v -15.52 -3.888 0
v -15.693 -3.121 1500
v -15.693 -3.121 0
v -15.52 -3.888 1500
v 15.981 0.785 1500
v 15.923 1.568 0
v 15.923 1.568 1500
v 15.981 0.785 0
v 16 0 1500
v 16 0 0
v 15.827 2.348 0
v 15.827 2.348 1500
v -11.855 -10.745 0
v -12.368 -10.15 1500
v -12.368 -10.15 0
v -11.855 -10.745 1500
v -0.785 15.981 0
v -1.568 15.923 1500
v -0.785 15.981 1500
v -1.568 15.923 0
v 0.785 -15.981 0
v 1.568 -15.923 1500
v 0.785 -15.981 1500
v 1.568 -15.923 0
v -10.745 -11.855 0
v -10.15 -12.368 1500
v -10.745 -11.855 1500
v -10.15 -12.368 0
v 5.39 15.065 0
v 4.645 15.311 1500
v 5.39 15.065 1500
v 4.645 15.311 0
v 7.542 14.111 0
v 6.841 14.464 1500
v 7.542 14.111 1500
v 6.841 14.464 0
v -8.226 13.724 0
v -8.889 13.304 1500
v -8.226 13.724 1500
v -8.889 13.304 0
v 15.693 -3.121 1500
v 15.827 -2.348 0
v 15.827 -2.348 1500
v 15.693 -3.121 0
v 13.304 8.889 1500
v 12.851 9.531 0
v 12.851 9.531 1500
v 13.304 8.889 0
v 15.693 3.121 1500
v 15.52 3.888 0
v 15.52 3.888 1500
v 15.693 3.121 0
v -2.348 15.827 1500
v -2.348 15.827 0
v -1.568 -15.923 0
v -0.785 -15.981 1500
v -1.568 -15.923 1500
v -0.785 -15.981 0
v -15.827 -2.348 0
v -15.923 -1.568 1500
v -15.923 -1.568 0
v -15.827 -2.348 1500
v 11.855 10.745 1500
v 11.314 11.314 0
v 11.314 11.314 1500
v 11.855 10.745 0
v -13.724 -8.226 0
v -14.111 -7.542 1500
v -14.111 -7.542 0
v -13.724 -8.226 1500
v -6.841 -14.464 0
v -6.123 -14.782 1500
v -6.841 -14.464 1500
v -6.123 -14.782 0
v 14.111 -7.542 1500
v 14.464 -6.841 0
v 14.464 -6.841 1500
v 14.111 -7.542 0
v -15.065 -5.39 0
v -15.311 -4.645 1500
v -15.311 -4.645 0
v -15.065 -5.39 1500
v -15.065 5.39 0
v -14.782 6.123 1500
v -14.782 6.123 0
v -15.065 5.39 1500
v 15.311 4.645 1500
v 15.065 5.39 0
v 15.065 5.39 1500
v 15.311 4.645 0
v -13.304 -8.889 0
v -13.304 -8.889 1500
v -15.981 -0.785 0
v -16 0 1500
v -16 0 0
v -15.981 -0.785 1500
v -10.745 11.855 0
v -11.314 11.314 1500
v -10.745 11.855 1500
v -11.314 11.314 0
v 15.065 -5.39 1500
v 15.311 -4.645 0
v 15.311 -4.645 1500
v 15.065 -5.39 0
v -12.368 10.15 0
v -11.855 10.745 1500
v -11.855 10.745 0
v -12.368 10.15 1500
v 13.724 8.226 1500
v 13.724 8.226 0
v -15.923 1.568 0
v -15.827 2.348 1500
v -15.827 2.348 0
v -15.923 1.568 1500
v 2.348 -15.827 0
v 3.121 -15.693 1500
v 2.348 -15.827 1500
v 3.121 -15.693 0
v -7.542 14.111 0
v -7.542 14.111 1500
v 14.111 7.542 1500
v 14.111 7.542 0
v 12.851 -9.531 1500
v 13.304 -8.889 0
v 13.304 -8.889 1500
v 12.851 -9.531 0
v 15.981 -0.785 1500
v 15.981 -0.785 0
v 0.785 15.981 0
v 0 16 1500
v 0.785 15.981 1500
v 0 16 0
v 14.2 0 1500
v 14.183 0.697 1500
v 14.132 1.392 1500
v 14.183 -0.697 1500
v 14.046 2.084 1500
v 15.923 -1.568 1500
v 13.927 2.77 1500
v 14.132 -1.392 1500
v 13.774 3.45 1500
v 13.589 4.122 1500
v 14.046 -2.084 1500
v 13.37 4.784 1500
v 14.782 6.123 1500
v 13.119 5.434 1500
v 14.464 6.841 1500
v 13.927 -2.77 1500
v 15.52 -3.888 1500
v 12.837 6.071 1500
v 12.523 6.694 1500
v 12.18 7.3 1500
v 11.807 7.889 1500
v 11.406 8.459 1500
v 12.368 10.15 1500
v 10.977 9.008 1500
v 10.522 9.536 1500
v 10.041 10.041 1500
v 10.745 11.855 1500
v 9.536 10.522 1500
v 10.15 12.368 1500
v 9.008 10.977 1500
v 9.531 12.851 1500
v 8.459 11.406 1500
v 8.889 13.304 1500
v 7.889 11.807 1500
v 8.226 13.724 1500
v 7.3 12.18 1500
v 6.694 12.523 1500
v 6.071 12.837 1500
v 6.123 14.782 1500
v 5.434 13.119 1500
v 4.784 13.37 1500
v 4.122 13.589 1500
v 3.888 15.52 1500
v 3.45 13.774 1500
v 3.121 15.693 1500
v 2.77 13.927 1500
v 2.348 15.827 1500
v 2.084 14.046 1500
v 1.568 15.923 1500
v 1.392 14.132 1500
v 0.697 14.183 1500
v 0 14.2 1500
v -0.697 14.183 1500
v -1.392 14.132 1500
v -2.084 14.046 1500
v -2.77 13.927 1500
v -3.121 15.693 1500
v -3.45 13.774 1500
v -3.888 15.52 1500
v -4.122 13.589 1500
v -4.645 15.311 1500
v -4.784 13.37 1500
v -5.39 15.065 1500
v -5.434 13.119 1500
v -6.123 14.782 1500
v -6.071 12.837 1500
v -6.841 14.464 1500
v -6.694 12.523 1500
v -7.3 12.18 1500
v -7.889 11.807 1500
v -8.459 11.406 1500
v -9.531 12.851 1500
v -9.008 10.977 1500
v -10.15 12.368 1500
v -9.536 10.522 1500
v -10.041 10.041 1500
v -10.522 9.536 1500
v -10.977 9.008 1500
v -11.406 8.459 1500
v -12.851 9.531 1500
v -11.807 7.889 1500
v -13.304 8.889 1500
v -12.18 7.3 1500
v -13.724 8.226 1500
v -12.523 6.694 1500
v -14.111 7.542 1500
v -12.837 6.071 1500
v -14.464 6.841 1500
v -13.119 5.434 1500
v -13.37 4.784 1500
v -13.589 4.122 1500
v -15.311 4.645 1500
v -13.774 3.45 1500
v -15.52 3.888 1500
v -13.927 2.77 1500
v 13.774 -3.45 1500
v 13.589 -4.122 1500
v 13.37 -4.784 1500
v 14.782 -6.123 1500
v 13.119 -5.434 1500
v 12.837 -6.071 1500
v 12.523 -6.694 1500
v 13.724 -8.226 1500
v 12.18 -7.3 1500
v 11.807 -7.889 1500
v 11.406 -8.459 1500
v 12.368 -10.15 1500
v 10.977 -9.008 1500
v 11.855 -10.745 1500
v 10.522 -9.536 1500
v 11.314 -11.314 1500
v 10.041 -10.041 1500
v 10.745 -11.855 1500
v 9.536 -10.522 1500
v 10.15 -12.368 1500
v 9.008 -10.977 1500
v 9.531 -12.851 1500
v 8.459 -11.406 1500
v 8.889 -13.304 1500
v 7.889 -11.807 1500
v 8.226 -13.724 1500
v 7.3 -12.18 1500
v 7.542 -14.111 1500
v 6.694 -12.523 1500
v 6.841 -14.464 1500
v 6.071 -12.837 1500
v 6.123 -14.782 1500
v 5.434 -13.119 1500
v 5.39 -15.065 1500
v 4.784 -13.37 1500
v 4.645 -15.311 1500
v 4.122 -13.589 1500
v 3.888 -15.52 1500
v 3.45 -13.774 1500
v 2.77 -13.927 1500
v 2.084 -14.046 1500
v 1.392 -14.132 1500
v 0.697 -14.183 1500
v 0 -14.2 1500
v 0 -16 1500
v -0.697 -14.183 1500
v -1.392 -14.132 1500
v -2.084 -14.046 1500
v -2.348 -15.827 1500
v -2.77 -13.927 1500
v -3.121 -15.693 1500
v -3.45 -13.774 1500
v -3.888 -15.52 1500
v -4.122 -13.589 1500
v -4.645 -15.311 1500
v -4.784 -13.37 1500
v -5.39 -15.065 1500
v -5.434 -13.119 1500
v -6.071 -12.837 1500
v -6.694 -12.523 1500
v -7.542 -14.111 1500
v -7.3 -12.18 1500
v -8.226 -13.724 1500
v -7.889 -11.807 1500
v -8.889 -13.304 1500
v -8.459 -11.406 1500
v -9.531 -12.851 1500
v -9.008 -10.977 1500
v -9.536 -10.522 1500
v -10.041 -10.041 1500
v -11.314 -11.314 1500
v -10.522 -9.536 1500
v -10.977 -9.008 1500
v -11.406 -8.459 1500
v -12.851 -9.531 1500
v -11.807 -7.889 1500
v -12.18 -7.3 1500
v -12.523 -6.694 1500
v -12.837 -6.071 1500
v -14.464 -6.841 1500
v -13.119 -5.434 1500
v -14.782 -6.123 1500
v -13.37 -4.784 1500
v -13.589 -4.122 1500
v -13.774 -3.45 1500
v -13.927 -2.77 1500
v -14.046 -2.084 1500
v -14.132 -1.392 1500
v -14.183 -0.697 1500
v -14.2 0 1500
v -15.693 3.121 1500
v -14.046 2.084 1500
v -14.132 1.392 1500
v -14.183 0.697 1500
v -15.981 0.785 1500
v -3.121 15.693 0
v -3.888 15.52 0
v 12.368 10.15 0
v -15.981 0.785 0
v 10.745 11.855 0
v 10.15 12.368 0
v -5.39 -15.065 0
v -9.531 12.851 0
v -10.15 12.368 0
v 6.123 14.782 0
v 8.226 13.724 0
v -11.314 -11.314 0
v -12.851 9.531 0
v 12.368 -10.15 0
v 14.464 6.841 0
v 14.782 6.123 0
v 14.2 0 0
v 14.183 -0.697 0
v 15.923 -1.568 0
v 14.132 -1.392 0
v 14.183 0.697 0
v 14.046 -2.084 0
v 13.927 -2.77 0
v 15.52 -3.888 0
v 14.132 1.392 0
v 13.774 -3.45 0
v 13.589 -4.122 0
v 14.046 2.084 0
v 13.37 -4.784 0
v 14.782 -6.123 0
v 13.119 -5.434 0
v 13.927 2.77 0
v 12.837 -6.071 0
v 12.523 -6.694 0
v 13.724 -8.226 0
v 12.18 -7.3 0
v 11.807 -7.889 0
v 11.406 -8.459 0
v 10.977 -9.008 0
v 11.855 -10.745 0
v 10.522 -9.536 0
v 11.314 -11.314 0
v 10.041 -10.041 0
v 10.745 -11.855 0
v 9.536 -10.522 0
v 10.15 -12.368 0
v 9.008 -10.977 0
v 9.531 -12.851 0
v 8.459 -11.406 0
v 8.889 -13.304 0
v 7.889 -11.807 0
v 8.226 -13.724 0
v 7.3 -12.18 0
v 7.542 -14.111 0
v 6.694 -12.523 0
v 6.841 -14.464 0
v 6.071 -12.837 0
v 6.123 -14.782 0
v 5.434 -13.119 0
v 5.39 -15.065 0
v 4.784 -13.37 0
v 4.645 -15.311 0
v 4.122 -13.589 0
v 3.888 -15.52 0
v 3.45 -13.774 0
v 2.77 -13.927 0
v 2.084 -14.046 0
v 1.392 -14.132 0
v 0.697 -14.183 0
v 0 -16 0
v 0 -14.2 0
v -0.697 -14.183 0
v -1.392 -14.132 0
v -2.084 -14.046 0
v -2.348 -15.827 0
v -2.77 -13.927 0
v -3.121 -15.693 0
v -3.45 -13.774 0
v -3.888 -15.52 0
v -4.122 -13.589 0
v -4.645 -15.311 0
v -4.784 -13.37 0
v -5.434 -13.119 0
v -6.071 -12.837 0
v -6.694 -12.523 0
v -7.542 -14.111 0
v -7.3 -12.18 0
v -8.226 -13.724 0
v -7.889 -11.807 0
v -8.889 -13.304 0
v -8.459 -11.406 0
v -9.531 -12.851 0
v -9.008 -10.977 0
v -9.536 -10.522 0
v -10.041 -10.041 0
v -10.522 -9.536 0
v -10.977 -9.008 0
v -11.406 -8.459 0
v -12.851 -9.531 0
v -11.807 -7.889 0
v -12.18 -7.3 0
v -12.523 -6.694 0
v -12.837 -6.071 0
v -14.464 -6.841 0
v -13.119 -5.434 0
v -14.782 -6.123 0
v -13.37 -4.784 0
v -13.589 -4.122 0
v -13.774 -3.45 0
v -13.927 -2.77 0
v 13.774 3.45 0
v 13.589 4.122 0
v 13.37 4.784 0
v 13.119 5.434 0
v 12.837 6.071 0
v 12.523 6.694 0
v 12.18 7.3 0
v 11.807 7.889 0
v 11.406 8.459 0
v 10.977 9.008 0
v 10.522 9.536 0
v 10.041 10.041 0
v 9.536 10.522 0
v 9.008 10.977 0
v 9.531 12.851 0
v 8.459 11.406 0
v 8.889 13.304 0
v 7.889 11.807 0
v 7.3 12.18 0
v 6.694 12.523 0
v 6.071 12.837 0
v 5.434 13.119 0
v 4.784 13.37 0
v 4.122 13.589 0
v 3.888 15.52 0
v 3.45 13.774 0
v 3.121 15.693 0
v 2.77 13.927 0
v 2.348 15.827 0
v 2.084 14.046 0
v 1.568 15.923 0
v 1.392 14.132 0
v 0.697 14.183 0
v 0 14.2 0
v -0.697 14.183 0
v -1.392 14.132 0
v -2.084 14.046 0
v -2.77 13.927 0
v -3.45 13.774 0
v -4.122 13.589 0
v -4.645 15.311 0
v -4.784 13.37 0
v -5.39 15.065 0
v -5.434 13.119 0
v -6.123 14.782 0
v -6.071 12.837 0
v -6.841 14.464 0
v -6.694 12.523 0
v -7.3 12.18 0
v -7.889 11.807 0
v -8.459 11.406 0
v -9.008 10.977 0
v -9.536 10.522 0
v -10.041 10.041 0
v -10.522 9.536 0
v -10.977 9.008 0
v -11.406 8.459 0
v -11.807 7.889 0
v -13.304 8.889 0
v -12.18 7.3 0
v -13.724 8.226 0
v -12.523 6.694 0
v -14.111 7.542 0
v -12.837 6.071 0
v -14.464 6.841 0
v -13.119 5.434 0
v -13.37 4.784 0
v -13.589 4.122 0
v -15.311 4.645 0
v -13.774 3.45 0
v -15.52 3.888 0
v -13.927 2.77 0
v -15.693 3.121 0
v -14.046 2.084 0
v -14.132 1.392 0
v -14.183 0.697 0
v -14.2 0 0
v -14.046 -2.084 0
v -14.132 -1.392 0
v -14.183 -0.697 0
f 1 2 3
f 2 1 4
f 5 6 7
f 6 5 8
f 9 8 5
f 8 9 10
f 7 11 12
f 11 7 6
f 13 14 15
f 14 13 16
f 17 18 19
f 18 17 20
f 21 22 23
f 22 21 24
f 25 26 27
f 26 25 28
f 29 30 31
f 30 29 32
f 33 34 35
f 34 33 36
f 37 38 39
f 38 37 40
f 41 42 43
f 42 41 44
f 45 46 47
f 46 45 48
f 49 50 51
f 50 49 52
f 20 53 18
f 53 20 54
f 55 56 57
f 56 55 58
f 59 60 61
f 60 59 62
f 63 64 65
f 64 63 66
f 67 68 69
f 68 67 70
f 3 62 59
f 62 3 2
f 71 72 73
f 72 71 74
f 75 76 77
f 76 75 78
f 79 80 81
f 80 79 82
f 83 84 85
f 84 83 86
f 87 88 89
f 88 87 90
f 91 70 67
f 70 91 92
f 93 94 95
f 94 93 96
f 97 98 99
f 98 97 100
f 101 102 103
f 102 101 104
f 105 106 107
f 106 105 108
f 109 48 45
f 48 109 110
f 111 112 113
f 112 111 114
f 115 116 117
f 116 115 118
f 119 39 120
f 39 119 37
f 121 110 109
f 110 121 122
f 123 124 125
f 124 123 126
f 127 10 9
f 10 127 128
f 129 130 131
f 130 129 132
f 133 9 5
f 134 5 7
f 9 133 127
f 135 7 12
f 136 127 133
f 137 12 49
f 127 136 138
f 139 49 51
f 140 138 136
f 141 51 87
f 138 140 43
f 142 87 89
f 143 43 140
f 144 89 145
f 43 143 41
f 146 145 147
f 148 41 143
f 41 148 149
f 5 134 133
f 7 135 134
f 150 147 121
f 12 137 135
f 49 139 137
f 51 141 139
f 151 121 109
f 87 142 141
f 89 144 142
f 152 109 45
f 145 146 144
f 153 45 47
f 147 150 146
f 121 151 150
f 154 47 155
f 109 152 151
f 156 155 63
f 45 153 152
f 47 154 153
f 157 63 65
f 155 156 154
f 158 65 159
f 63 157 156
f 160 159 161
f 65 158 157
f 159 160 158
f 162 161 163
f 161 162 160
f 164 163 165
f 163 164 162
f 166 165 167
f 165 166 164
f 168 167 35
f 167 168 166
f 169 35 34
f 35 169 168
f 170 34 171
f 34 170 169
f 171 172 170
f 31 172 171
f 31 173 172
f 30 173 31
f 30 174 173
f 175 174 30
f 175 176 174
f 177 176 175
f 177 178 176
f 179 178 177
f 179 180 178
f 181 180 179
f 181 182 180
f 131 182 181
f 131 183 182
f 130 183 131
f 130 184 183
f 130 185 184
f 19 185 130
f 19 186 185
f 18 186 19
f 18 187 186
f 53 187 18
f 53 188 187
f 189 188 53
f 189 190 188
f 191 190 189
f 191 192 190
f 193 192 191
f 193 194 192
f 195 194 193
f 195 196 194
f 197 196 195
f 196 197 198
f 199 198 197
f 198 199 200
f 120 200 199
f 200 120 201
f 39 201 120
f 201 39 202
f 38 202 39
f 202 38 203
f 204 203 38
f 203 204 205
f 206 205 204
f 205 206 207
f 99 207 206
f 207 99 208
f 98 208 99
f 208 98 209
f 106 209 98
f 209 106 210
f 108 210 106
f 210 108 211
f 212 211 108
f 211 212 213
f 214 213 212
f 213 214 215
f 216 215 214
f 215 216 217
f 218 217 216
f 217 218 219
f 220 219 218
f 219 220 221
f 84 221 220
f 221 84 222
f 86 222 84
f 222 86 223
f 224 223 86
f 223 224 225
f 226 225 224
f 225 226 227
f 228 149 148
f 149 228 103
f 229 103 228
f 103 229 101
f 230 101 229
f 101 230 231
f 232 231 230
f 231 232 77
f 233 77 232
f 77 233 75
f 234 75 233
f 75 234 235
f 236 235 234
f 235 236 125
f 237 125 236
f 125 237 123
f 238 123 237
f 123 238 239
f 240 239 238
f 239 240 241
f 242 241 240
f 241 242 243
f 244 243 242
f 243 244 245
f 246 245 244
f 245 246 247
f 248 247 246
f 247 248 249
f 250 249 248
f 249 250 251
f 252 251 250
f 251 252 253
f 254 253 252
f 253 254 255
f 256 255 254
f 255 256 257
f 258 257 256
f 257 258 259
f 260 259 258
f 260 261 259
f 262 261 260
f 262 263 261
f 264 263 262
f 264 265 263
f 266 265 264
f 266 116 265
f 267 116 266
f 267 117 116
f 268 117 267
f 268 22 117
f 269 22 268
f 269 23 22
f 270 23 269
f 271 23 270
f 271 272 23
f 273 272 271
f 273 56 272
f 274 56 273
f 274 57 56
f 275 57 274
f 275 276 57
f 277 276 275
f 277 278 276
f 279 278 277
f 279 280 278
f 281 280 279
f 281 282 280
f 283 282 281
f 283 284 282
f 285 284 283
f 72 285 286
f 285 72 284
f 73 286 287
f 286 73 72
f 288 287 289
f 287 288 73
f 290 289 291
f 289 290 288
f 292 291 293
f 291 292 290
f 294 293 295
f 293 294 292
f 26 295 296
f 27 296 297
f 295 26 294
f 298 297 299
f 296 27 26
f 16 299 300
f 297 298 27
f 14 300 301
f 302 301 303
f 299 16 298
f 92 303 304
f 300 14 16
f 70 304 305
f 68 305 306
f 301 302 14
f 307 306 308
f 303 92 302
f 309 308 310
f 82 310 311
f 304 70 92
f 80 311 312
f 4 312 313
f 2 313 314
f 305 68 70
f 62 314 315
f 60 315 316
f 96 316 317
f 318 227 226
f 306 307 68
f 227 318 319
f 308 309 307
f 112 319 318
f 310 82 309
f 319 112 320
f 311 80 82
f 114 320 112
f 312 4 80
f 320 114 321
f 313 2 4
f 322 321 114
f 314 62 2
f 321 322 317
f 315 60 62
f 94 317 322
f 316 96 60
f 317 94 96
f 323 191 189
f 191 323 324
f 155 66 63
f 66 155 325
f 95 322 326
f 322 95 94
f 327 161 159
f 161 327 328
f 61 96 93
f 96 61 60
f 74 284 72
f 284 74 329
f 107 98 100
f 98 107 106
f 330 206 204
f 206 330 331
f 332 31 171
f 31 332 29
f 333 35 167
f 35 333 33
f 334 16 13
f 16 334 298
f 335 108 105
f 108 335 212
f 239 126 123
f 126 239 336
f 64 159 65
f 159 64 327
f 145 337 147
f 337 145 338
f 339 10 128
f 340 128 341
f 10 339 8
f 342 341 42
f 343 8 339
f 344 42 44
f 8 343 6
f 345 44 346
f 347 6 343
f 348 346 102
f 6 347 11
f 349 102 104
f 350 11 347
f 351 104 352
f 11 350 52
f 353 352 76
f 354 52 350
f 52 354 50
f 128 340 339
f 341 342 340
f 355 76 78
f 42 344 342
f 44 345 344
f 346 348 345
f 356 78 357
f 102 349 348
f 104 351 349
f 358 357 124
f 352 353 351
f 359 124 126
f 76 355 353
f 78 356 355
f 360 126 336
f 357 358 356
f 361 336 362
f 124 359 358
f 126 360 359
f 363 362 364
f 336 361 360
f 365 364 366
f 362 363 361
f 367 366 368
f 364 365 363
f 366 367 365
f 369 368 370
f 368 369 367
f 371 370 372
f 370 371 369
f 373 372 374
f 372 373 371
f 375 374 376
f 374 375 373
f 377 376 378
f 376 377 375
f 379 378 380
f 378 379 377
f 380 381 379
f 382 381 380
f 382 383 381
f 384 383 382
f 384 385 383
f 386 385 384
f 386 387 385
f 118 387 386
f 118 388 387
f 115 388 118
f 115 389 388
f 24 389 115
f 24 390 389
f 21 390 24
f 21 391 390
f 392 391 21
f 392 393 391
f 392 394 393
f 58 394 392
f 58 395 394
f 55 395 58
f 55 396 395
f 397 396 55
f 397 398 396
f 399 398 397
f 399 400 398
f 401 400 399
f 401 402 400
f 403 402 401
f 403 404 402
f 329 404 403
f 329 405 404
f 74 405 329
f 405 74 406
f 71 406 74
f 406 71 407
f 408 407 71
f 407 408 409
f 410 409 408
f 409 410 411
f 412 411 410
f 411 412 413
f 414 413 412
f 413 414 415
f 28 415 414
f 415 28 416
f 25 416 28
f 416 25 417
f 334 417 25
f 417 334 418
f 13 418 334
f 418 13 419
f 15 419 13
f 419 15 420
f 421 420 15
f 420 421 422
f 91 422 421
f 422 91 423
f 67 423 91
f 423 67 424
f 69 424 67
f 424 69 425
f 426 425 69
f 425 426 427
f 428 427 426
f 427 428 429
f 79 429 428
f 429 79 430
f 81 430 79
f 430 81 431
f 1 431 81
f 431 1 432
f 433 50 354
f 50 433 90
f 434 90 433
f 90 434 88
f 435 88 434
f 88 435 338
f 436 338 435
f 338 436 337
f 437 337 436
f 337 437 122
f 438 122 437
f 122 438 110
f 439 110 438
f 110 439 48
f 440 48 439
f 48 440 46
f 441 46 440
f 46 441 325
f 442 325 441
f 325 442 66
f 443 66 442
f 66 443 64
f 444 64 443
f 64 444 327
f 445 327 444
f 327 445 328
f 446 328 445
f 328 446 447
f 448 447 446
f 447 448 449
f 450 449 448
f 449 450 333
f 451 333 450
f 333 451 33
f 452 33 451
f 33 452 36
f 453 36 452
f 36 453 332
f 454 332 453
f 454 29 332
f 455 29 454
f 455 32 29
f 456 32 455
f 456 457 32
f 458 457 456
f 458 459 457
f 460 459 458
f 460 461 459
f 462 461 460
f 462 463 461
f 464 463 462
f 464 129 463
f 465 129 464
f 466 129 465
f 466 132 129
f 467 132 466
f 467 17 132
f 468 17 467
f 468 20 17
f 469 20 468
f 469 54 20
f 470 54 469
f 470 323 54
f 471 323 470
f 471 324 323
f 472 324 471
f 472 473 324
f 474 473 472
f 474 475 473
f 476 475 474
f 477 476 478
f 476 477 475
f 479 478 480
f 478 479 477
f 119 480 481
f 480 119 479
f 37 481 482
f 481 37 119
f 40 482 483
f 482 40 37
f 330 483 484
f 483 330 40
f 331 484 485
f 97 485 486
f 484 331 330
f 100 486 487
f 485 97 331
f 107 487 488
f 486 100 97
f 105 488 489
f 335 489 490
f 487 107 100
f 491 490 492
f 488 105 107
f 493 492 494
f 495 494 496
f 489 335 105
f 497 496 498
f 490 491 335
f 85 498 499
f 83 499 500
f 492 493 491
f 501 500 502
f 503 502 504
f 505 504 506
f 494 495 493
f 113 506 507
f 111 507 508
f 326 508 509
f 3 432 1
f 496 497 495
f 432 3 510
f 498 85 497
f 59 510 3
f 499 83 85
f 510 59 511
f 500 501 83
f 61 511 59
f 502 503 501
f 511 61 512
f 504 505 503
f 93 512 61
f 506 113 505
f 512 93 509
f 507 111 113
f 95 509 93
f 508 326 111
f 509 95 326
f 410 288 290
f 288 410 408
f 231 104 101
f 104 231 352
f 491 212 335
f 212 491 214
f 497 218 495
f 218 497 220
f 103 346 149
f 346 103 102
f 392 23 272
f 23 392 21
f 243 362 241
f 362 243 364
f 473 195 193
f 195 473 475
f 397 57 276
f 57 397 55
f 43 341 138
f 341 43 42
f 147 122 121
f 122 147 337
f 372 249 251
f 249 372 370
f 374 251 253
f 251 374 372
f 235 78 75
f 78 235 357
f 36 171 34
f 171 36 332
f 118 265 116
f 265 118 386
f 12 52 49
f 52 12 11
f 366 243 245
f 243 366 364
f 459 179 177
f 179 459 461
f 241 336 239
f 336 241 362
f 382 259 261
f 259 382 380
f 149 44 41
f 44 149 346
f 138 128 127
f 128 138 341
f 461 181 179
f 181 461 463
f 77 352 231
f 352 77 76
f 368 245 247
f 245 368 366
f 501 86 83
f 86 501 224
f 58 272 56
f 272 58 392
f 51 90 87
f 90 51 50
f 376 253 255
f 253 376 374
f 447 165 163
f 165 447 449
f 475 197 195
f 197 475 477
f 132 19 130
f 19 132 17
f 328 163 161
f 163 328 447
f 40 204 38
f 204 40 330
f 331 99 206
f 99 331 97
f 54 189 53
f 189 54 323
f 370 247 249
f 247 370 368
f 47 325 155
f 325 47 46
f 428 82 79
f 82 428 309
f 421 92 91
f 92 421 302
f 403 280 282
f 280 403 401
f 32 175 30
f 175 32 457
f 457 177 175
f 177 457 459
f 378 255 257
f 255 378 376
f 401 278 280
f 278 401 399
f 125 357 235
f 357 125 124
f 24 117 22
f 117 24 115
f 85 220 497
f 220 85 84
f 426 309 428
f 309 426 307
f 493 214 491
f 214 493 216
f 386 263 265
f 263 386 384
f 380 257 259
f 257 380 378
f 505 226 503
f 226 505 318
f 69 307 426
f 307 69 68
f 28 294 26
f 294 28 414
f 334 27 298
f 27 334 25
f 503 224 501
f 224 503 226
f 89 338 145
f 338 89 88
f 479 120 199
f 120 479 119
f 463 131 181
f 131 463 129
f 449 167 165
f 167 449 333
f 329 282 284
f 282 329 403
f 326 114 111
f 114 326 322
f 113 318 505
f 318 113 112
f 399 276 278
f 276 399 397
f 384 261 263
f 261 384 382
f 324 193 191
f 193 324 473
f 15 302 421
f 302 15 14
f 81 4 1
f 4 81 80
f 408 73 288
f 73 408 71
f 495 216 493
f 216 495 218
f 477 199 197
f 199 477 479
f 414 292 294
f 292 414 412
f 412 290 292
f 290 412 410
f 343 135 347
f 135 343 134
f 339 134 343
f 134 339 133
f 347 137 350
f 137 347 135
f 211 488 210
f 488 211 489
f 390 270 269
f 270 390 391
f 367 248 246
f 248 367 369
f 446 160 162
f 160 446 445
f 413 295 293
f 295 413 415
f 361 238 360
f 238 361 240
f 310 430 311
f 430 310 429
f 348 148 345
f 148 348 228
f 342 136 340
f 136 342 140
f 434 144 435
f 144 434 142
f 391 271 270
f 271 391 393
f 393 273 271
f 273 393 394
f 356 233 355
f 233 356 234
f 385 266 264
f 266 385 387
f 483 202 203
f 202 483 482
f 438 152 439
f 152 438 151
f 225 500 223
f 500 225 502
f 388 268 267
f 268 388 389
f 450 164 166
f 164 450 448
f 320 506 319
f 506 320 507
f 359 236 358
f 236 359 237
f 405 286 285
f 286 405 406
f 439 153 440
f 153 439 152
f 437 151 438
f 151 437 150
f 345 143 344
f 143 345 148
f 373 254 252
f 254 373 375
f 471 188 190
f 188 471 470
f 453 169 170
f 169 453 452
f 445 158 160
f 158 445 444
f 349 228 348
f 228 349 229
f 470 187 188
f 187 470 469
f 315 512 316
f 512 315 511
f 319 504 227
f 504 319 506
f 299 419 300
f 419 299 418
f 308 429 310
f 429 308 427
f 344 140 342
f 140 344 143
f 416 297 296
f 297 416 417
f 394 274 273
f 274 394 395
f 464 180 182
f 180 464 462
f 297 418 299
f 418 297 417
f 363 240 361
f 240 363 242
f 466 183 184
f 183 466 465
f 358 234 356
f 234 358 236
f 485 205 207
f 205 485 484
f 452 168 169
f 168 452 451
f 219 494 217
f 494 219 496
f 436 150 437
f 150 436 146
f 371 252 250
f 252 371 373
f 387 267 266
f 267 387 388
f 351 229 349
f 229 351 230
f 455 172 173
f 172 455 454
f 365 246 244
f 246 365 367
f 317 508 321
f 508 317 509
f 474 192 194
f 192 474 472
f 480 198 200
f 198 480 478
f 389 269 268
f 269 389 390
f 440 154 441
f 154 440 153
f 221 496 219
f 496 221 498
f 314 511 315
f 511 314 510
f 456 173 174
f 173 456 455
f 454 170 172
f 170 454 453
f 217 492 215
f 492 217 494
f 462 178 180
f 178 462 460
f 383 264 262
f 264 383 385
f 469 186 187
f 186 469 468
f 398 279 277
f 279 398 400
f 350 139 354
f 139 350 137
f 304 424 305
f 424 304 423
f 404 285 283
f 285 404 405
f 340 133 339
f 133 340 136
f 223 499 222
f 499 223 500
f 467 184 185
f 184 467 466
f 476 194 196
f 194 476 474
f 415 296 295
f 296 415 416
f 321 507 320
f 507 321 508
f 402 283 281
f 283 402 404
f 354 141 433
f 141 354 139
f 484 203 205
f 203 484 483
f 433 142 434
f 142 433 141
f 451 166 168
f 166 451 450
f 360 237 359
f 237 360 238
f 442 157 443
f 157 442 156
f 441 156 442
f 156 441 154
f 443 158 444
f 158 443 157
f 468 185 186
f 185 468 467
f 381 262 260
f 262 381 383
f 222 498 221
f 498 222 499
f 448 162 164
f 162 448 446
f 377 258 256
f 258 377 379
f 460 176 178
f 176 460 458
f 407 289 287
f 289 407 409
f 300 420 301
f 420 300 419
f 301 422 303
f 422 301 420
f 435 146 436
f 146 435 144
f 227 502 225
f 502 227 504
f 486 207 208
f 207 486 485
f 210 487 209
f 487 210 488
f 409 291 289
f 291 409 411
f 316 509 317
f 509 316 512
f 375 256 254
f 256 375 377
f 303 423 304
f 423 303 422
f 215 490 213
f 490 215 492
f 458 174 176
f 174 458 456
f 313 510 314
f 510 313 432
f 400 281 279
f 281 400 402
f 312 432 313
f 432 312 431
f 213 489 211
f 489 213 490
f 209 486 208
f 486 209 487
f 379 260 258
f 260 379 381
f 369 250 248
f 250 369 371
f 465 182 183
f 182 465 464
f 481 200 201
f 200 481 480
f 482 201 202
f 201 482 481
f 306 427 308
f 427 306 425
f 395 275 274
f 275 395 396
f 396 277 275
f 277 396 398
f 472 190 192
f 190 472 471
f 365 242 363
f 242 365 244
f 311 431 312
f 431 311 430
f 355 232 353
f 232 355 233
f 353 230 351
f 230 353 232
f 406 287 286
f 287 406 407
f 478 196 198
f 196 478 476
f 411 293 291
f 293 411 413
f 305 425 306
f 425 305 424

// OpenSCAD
$fn = 128;

// HT 32 pipe (approx): OD 32 mm, wall 1.8 mm, length 1500 mm
od = 32;
wall = 1.8;
id = od - 2*wall;
len = 1500;

difference() {
  cylinder(h = len, d = od);
  translate([0,0,-0.5])
    cylinder(h = len + 1, d = id);
}
